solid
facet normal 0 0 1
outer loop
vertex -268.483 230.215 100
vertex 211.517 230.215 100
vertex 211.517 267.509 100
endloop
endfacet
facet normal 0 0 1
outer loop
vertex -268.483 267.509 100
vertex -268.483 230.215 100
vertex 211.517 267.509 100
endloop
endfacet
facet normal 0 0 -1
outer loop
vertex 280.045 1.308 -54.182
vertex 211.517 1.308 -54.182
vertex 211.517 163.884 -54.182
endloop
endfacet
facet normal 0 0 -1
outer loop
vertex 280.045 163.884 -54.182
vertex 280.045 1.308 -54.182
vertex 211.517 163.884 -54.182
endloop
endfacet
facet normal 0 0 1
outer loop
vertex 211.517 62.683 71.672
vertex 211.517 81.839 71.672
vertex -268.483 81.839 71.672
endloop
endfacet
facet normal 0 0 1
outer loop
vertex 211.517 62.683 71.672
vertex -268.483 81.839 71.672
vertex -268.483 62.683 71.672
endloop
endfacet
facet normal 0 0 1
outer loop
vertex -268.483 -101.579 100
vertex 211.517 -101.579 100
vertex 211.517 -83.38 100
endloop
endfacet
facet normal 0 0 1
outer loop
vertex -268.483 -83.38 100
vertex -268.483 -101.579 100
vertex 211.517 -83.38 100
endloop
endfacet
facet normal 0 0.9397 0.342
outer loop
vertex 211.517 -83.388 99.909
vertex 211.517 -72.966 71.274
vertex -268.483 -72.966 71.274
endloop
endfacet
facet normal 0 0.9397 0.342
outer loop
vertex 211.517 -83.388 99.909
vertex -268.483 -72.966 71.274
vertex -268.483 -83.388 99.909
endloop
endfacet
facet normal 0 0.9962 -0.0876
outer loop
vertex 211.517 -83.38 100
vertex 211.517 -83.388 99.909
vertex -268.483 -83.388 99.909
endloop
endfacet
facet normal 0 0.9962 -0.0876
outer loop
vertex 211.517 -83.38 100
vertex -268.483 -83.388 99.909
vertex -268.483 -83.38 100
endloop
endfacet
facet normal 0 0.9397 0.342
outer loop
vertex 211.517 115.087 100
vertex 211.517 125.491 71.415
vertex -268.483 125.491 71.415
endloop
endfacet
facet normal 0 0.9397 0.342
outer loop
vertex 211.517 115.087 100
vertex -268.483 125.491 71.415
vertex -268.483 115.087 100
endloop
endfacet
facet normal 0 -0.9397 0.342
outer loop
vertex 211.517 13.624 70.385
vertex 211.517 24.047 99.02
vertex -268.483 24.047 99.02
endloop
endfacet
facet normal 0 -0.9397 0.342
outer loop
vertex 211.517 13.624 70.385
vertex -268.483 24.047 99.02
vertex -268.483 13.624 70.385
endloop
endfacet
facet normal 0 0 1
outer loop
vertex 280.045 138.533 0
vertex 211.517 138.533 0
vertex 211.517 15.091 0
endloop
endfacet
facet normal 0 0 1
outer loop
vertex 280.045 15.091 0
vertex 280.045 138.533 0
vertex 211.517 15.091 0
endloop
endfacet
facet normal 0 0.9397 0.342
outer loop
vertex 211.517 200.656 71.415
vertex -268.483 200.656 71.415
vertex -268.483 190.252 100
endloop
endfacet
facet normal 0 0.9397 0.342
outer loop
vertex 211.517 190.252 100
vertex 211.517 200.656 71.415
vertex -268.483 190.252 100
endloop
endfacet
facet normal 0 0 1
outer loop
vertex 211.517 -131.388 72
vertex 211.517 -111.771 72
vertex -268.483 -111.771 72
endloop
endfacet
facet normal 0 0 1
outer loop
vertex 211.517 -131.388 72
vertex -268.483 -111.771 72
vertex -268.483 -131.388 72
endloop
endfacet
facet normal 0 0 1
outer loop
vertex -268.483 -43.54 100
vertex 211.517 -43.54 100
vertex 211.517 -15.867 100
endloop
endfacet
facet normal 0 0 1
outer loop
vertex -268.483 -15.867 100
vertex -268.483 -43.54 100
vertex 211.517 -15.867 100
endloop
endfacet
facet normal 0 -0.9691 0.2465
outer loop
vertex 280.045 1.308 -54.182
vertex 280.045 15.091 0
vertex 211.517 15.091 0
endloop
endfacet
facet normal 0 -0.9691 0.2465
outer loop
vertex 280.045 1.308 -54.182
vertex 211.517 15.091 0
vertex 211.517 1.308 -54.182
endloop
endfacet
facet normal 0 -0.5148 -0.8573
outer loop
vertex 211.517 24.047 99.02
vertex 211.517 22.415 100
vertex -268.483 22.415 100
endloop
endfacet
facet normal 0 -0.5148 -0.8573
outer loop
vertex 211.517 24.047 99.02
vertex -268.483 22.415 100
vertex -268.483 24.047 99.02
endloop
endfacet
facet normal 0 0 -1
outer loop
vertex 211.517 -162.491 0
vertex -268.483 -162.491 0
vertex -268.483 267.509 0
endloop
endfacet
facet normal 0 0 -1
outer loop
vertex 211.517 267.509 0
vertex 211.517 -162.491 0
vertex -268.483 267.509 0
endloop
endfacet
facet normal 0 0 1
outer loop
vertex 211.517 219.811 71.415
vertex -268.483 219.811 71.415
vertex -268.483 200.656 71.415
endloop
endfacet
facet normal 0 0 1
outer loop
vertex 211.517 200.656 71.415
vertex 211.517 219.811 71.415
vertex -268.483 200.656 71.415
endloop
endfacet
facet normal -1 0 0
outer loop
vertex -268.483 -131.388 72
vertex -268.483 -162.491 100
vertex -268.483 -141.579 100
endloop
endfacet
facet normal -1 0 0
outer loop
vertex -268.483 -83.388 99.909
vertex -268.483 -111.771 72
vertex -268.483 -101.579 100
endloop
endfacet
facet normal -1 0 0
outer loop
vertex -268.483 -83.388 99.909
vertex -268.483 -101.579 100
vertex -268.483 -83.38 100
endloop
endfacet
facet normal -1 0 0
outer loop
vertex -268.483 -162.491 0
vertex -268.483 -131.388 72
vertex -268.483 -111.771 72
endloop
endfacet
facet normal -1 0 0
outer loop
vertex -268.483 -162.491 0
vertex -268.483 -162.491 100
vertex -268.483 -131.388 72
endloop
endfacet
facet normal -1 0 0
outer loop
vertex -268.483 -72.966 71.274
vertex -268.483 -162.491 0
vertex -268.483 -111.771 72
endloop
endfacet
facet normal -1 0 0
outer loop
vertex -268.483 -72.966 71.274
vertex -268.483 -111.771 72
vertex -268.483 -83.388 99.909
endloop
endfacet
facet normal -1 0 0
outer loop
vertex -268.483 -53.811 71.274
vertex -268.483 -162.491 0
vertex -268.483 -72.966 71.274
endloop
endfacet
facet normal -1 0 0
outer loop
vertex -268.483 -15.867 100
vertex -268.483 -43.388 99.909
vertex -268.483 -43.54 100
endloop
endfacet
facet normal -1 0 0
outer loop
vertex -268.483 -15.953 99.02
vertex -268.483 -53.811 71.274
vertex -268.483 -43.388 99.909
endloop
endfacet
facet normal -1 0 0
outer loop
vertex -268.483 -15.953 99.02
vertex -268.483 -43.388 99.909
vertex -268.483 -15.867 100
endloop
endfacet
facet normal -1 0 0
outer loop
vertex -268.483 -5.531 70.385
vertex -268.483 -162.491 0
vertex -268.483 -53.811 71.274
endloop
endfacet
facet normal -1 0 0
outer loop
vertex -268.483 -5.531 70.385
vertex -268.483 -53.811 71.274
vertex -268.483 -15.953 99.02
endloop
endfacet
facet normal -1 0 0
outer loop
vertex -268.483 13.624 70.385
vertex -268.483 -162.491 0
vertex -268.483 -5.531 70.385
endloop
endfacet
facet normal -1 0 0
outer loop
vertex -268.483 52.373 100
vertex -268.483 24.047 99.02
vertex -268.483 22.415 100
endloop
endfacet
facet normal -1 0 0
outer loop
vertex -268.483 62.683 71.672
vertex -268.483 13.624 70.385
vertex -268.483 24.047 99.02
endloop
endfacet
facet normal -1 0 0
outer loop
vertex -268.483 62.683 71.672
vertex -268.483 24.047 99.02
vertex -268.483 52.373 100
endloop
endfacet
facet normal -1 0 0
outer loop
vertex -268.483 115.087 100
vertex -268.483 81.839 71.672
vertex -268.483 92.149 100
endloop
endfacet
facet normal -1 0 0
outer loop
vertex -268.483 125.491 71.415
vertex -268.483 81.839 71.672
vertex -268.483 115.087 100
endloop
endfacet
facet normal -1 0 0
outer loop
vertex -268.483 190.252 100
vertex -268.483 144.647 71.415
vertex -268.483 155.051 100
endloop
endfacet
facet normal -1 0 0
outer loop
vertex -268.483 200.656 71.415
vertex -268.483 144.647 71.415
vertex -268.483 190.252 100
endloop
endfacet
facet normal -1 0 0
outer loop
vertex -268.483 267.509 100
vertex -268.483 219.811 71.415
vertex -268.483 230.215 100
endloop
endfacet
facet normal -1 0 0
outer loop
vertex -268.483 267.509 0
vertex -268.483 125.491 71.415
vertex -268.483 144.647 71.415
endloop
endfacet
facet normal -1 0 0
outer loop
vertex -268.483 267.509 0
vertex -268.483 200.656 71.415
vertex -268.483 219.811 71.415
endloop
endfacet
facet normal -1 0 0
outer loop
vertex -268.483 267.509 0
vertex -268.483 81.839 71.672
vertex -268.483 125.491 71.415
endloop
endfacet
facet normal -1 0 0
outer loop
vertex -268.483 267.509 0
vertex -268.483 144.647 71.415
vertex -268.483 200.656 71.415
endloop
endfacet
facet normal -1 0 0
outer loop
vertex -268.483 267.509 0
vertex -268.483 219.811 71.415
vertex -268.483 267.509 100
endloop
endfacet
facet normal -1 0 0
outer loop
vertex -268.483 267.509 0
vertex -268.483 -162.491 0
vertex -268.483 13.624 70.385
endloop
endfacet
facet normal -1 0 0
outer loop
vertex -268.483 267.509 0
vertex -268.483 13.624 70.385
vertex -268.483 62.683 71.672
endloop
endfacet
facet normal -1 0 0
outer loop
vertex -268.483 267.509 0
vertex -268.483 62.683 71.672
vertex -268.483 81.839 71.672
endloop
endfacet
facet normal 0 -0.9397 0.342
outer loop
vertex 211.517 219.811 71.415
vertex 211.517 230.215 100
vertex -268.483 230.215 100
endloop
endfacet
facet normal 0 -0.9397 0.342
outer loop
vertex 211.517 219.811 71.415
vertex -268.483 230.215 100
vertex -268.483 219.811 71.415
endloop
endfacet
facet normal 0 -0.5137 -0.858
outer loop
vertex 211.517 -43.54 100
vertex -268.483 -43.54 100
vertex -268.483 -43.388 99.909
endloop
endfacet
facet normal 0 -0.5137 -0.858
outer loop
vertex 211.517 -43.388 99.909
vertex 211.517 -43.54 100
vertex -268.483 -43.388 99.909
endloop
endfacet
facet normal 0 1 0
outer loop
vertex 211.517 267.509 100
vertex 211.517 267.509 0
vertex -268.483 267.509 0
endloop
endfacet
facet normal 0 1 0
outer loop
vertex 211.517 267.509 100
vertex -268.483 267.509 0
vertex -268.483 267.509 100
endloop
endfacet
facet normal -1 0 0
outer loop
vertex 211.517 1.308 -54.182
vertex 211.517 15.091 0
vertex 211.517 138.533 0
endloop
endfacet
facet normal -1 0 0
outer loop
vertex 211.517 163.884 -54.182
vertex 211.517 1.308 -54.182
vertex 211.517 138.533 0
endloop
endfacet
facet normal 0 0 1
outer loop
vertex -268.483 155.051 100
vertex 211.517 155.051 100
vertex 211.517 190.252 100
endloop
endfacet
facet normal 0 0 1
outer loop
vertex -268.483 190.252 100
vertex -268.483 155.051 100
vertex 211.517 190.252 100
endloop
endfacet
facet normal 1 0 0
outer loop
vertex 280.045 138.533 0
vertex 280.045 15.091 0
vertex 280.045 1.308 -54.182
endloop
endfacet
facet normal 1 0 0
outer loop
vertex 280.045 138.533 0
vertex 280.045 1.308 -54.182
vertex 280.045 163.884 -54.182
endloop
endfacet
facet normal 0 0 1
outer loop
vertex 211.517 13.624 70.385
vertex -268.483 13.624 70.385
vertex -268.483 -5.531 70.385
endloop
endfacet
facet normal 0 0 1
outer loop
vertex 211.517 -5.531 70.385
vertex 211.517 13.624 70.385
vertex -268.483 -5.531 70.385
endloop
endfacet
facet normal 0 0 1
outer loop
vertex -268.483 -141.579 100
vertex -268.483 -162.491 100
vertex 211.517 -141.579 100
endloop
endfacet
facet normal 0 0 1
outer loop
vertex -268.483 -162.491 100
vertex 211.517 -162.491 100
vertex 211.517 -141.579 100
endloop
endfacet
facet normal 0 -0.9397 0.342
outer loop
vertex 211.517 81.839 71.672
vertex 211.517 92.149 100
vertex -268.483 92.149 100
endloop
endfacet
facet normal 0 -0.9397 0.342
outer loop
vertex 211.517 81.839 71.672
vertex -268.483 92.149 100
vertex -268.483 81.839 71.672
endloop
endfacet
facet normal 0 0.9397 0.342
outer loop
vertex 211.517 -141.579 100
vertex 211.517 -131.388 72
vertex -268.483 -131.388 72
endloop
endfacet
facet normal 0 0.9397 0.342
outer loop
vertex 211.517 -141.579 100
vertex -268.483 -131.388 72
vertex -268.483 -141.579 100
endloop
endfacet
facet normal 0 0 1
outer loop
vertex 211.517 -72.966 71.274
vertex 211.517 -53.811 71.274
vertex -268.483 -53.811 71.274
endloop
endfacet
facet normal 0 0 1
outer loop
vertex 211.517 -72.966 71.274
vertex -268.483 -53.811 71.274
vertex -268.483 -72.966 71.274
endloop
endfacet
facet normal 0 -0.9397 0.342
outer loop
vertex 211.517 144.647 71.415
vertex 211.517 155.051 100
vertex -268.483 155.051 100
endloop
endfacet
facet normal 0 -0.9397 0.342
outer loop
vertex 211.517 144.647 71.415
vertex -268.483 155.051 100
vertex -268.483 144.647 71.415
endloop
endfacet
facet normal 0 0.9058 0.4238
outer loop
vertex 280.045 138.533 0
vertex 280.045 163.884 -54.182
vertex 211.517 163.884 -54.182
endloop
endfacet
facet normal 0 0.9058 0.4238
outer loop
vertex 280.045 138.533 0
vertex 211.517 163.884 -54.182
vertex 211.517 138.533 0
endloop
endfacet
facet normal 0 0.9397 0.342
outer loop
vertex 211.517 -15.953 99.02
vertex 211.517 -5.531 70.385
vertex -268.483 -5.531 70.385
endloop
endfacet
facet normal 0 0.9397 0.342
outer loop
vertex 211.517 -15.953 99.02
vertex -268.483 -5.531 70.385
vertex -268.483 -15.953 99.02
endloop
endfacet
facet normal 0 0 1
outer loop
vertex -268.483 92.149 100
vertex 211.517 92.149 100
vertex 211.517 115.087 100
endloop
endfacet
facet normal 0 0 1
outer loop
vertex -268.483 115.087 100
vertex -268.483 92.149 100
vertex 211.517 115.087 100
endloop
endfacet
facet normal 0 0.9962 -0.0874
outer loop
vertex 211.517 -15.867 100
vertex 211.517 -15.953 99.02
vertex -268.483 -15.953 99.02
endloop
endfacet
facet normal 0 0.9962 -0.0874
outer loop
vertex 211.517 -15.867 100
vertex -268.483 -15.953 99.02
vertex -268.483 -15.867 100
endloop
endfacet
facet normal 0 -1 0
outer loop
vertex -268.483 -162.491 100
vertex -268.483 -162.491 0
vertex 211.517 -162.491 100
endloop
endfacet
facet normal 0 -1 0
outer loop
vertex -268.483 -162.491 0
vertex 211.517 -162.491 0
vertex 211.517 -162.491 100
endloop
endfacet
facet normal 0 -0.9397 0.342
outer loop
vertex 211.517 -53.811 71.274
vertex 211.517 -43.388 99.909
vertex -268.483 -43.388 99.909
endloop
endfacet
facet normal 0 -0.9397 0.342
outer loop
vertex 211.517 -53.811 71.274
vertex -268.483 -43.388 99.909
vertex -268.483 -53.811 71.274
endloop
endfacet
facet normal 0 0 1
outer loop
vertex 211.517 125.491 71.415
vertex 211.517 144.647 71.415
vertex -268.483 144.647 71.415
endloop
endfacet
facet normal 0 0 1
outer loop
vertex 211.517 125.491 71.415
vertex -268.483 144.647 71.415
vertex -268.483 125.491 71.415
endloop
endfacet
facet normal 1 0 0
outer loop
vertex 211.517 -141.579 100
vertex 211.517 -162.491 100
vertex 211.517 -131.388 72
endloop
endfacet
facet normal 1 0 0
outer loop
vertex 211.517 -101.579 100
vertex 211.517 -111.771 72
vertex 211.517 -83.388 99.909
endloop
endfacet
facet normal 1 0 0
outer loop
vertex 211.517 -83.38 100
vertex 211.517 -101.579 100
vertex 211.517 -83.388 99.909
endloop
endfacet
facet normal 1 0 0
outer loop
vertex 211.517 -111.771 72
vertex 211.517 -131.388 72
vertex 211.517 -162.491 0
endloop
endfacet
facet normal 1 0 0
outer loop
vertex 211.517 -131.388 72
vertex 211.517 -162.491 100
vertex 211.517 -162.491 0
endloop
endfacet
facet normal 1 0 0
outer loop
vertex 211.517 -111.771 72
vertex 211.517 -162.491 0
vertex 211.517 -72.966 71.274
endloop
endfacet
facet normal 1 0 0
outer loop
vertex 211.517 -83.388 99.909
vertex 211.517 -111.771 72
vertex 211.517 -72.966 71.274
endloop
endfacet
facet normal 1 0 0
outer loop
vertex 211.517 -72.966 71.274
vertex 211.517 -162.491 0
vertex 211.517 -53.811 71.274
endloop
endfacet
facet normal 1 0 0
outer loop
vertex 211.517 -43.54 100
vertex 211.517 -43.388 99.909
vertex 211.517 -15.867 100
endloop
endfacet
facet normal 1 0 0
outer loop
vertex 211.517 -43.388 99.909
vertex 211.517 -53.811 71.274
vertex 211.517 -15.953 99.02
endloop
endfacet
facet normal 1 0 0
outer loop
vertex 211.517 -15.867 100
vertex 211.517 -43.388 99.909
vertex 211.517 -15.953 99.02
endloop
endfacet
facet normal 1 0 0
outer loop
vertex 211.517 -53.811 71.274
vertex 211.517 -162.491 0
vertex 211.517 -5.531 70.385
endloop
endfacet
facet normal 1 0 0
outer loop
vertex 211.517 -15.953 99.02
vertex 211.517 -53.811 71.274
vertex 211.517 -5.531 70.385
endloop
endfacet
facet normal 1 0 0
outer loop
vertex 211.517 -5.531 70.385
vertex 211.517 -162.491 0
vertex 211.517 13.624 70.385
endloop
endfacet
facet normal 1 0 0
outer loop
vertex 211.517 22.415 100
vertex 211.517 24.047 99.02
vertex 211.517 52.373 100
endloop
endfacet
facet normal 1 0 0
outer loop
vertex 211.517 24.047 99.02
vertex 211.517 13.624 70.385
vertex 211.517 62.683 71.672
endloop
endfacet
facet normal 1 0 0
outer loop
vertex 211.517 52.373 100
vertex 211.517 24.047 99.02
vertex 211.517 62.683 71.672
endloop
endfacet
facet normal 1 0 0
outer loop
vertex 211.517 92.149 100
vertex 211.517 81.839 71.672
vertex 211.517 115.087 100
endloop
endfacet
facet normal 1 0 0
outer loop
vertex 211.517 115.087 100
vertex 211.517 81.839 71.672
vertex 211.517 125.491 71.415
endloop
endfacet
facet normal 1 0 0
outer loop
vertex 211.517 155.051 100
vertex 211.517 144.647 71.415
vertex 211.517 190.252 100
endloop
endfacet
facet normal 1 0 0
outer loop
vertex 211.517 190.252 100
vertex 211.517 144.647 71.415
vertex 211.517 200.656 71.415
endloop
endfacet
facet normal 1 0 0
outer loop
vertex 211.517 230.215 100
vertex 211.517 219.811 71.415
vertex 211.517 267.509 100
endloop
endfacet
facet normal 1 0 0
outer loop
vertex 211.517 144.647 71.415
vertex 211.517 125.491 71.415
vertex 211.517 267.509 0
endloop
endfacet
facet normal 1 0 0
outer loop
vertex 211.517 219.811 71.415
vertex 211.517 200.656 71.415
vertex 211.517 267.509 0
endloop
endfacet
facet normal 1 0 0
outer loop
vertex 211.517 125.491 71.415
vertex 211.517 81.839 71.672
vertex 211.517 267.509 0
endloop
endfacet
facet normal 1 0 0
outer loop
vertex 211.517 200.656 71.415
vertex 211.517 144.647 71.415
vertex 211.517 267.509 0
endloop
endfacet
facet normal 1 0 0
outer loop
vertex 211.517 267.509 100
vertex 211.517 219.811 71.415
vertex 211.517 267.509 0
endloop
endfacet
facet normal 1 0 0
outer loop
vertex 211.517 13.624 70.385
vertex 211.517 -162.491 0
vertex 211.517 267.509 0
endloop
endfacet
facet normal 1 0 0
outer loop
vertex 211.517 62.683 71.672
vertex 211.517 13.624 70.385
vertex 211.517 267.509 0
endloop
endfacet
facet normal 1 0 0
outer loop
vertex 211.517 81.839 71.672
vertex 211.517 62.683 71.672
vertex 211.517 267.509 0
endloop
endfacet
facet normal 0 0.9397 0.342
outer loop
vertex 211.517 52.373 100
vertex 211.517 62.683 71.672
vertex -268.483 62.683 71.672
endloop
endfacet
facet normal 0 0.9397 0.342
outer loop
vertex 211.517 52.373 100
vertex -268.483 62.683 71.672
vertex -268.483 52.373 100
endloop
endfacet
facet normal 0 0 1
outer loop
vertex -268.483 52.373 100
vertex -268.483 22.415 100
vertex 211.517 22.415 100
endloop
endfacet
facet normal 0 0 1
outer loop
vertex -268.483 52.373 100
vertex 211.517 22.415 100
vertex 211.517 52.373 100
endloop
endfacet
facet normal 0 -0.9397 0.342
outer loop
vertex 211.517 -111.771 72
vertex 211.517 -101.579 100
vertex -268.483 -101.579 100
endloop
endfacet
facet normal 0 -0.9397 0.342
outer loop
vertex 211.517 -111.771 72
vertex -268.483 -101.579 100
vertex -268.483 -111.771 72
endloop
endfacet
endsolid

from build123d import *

# Parameters (mm, degrees)
F0_W     = 430
F0_H     = 430
F1_DEPTH = 100
F3_DEPTH = 430.001
F5_DEPTH = 25
F6_DEPTH = 25
F7_DEPTH = 39.3531173468
F9_DEPTH = 68.528033793


with BuildPart() as f1:
    # F0 (on Top) → F1 (new body)
    with BuildSketch(Plane.XY):
        with Locations((-3.4830234945, 52.508988921)):
            Rectangle(F0_W, F0_H)
    extrude(amount=F1_DEPTH)

    # F2 (on face) → F3 (cut, through all)
    with BuildSketch(Plane.YZ.offset(211.5169765055)):
        Polygon((-140.8071517944, 108.7719500065), (-141.579374671, 100), (-131.3882081115, 72), (-111.7705412304, 72), (-101.579374671, 100), (-120.4716265202, 111.3460659981), align=None)
        Polygon((-53.8106647075, 71.2742882862), (-43.3884207408, 99.9091682449), (-62.2806725899, 111.255234243), (-82.6161978642, 108.6811182514), (-83.3884207408, 99.9091682449), (-72.966176774, 71.2742882862), align=None)
        Polygon((13.6244201346, 70.3853269189), (24.0466641014, 99.0202068776), (5.1544122522, 110.3662728757), (-15.1811130221, 107.7921568841), (-15.9533358986, 99.0202068776), (-5.5310919319, 70.3853269189), align=None)
        Polygon((81.838506019, 71.6723867774), (92.2607499858, 100.307266736), (73.3684981366, 111.6533327341), (53.0329728623, 109.0792167425), (52.2607499858, 100.307266736), (62.6829939525, 71.6723867774), align=None)
        Polygon((144.6469358414, 71.414971546), (155.0691798081, 100.0498515047), (136.1769279589, 111.3959175028), (115.8414026846, 108.8218015112), (115.0691798081, 100.0498515047), (125.4914237748, 71.414971546), align=None)
        Polygon((219.8111479881, 71.4149692177), (230.2333919549, 100.0498491764), (211.3411401057, 111.3959151745), (191.0056148314, 108.8217991829), (190.2333919549, 100.0498491764), (200.6556359216, 71.4149692177), align=None)
    extrude(amount=-F3_DEPTH, mode=Mode.SUBTRACT)

    # F5 (add): a face of the model
    f5_faces = [f1.faces().sort_by_distance(p)[0] for p in [
        (-218.4830234945, 54.284043672, 44.9792254446),
    ]]
    extrude(f5_faces, amount=F5_DEPTH)

    # F6 (add): a face of the model
    f6_faces = [f1.faces().sort_by_distance(p)[0] for p in [
        (-243.4830234945, 54.284043672, 44.9792254446),
    ]]
    extrude(f6_faces, amount=F6_DEPTH)

    # F7 (cut): a face of the model
    f7_faces = [f1.faces().sort_by_distance(p)[0] for p in [
        (-268.4830234945, 54.284043672, 44.9792254446),
    ]]
    extrude(f7_faces, amount=F7_DEPTH, mode=Mode.SUBTRACT)


with BuildPart() as f9:
    # F8 (on face) → F9 (new body)
    with BuildSketch(Plane.YZ.offset(211.5169765055)):
        Polygon((15.0914195739, 0), (1.3082925091, -54.1821345687), (163.8840287924, -54.1821345687), (138.5330332329, 0), align=None)
    extrude(amount=F9_DEPTH)


solid = Compound([f1.part, f9.part])
